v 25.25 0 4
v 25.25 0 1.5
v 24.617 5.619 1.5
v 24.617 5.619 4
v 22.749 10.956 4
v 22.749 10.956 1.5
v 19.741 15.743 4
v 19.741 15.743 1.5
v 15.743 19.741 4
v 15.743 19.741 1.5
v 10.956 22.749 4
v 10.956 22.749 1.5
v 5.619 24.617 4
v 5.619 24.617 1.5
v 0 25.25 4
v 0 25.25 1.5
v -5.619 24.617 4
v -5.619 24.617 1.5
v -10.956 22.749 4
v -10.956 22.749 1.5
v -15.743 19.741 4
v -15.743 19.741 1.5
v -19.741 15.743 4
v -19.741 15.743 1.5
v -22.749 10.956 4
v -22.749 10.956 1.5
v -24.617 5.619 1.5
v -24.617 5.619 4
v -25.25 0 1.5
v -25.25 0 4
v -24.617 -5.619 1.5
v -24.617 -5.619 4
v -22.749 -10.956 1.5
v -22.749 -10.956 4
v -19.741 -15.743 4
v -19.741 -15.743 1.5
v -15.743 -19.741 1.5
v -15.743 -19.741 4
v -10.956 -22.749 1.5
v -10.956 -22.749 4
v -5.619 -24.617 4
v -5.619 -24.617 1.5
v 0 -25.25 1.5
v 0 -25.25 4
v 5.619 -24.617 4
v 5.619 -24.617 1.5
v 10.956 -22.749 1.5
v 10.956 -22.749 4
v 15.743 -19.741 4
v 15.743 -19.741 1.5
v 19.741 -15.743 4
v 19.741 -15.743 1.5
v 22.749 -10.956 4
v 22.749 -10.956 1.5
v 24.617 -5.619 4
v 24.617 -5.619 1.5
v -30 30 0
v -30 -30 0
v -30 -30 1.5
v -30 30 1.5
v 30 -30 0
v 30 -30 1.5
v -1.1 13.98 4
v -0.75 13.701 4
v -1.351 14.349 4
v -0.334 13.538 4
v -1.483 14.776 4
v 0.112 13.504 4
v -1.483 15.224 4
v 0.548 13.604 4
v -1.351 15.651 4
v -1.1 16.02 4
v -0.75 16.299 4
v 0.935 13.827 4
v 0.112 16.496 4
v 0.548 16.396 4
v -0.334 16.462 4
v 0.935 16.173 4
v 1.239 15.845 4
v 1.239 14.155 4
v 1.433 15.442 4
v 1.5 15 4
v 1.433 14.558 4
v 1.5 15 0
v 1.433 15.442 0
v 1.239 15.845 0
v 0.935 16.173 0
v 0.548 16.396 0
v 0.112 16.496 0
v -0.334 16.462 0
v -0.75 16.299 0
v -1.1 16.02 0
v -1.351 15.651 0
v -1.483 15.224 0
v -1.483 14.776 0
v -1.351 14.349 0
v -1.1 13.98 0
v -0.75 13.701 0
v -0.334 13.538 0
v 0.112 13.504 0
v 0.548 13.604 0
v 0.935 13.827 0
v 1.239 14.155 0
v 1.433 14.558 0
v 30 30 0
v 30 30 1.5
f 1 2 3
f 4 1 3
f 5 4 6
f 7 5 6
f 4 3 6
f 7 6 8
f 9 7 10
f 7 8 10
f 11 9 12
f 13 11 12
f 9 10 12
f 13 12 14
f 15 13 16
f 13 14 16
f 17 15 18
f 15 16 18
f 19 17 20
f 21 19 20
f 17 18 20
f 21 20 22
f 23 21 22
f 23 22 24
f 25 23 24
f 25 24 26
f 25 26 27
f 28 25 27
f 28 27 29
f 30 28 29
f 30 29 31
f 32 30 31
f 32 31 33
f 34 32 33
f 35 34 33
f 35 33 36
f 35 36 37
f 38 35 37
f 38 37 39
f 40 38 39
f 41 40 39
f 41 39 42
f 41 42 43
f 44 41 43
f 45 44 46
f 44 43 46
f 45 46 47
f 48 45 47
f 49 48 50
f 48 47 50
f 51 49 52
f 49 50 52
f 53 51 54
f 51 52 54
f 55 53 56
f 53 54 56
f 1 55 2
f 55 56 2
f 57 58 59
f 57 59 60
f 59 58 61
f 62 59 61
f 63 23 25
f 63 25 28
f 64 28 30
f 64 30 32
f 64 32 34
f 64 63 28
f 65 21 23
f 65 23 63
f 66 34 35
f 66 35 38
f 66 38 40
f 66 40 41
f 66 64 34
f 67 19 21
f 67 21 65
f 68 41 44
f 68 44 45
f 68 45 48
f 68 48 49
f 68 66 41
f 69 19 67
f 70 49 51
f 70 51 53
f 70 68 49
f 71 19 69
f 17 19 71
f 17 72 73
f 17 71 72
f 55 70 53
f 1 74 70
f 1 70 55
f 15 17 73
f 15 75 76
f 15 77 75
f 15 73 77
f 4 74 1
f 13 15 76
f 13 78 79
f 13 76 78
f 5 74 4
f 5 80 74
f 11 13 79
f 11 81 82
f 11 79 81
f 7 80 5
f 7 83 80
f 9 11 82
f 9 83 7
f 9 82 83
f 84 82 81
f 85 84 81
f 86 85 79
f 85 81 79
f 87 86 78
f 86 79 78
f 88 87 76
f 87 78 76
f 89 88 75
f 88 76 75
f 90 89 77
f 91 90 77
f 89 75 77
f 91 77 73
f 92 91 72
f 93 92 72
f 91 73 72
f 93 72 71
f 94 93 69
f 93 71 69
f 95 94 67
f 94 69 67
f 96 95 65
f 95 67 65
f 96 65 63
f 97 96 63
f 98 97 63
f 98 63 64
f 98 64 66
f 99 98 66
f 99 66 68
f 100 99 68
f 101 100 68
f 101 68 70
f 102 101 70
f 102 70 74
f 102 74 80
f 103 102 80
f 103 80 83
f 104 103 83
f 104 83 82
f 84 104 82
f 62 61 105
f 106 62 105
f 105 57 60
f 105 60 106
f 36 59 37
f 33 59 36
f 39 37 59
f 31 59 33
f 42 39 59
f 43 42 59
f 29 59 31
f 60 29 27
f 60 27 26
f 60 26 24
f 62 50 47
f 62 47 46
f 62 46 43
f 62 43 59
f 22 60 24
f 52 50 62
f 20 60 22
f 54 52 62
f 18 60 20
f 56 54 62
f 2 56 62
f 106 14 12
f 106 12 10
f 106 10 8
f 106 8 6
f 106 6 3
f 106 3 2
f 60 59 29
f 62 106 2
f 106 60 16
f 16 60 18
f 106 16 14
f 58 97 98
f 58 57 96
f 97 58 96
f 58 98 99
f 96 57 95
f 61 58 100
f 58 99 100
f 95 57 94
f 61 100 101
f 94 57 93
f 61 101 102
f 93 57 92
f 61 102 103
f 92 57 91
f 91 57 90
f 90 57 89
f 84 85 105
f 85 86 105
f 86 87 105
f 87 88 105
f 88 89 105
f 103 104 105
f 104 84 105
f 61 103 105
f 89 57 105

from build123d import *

# Parameters (mm, degrees)
SKETCH1_R           = 25.25
BOSS_EXTRUDE1_DEPTH = 4
SKETCH1_4_W         = 60
SKETCH1_4_H         = 60
SKETCH1_4_R         = 25.25
BOSS_EXTRUDE2_DEPTH = 1.5
SKETCH2_R           = 1.5
CUT_EXTRUDE1_DEPTH  = 43.614551505


with BuildPart() as part:
    # Sketch1 → Boss-Extrude1 (new body)
    with BuildSketch(Plane.XY):
        Circle(SKETCH1_R)
    extrude(amount=BOSS_EXTRUDE1_DEPTH)

    # Sketch1<4> → Boss-Extrude2 (add)
    with BuildSketch(Plane.XY):
        Rectangle(SKETCH1_4_W, SKETCH1_4_H)
        Circle(SKETCH1_4_R, mode=Mode.SUBTRACT)
    extrude(amount=BOSS_EXTRUDE2_DEPTH)

    # Sketch2 → Cut-Extrude1 (cut, through all)
    with BuildSketch(Plane.XY.offset(4)):
        with Locations((0, 15)):
            Circle(SKETCH2_R)
    extrude(amount=-CUT_EXTRUDE1_DEPTH, mode=Mode.SUBTRACT)


solid = part.part
